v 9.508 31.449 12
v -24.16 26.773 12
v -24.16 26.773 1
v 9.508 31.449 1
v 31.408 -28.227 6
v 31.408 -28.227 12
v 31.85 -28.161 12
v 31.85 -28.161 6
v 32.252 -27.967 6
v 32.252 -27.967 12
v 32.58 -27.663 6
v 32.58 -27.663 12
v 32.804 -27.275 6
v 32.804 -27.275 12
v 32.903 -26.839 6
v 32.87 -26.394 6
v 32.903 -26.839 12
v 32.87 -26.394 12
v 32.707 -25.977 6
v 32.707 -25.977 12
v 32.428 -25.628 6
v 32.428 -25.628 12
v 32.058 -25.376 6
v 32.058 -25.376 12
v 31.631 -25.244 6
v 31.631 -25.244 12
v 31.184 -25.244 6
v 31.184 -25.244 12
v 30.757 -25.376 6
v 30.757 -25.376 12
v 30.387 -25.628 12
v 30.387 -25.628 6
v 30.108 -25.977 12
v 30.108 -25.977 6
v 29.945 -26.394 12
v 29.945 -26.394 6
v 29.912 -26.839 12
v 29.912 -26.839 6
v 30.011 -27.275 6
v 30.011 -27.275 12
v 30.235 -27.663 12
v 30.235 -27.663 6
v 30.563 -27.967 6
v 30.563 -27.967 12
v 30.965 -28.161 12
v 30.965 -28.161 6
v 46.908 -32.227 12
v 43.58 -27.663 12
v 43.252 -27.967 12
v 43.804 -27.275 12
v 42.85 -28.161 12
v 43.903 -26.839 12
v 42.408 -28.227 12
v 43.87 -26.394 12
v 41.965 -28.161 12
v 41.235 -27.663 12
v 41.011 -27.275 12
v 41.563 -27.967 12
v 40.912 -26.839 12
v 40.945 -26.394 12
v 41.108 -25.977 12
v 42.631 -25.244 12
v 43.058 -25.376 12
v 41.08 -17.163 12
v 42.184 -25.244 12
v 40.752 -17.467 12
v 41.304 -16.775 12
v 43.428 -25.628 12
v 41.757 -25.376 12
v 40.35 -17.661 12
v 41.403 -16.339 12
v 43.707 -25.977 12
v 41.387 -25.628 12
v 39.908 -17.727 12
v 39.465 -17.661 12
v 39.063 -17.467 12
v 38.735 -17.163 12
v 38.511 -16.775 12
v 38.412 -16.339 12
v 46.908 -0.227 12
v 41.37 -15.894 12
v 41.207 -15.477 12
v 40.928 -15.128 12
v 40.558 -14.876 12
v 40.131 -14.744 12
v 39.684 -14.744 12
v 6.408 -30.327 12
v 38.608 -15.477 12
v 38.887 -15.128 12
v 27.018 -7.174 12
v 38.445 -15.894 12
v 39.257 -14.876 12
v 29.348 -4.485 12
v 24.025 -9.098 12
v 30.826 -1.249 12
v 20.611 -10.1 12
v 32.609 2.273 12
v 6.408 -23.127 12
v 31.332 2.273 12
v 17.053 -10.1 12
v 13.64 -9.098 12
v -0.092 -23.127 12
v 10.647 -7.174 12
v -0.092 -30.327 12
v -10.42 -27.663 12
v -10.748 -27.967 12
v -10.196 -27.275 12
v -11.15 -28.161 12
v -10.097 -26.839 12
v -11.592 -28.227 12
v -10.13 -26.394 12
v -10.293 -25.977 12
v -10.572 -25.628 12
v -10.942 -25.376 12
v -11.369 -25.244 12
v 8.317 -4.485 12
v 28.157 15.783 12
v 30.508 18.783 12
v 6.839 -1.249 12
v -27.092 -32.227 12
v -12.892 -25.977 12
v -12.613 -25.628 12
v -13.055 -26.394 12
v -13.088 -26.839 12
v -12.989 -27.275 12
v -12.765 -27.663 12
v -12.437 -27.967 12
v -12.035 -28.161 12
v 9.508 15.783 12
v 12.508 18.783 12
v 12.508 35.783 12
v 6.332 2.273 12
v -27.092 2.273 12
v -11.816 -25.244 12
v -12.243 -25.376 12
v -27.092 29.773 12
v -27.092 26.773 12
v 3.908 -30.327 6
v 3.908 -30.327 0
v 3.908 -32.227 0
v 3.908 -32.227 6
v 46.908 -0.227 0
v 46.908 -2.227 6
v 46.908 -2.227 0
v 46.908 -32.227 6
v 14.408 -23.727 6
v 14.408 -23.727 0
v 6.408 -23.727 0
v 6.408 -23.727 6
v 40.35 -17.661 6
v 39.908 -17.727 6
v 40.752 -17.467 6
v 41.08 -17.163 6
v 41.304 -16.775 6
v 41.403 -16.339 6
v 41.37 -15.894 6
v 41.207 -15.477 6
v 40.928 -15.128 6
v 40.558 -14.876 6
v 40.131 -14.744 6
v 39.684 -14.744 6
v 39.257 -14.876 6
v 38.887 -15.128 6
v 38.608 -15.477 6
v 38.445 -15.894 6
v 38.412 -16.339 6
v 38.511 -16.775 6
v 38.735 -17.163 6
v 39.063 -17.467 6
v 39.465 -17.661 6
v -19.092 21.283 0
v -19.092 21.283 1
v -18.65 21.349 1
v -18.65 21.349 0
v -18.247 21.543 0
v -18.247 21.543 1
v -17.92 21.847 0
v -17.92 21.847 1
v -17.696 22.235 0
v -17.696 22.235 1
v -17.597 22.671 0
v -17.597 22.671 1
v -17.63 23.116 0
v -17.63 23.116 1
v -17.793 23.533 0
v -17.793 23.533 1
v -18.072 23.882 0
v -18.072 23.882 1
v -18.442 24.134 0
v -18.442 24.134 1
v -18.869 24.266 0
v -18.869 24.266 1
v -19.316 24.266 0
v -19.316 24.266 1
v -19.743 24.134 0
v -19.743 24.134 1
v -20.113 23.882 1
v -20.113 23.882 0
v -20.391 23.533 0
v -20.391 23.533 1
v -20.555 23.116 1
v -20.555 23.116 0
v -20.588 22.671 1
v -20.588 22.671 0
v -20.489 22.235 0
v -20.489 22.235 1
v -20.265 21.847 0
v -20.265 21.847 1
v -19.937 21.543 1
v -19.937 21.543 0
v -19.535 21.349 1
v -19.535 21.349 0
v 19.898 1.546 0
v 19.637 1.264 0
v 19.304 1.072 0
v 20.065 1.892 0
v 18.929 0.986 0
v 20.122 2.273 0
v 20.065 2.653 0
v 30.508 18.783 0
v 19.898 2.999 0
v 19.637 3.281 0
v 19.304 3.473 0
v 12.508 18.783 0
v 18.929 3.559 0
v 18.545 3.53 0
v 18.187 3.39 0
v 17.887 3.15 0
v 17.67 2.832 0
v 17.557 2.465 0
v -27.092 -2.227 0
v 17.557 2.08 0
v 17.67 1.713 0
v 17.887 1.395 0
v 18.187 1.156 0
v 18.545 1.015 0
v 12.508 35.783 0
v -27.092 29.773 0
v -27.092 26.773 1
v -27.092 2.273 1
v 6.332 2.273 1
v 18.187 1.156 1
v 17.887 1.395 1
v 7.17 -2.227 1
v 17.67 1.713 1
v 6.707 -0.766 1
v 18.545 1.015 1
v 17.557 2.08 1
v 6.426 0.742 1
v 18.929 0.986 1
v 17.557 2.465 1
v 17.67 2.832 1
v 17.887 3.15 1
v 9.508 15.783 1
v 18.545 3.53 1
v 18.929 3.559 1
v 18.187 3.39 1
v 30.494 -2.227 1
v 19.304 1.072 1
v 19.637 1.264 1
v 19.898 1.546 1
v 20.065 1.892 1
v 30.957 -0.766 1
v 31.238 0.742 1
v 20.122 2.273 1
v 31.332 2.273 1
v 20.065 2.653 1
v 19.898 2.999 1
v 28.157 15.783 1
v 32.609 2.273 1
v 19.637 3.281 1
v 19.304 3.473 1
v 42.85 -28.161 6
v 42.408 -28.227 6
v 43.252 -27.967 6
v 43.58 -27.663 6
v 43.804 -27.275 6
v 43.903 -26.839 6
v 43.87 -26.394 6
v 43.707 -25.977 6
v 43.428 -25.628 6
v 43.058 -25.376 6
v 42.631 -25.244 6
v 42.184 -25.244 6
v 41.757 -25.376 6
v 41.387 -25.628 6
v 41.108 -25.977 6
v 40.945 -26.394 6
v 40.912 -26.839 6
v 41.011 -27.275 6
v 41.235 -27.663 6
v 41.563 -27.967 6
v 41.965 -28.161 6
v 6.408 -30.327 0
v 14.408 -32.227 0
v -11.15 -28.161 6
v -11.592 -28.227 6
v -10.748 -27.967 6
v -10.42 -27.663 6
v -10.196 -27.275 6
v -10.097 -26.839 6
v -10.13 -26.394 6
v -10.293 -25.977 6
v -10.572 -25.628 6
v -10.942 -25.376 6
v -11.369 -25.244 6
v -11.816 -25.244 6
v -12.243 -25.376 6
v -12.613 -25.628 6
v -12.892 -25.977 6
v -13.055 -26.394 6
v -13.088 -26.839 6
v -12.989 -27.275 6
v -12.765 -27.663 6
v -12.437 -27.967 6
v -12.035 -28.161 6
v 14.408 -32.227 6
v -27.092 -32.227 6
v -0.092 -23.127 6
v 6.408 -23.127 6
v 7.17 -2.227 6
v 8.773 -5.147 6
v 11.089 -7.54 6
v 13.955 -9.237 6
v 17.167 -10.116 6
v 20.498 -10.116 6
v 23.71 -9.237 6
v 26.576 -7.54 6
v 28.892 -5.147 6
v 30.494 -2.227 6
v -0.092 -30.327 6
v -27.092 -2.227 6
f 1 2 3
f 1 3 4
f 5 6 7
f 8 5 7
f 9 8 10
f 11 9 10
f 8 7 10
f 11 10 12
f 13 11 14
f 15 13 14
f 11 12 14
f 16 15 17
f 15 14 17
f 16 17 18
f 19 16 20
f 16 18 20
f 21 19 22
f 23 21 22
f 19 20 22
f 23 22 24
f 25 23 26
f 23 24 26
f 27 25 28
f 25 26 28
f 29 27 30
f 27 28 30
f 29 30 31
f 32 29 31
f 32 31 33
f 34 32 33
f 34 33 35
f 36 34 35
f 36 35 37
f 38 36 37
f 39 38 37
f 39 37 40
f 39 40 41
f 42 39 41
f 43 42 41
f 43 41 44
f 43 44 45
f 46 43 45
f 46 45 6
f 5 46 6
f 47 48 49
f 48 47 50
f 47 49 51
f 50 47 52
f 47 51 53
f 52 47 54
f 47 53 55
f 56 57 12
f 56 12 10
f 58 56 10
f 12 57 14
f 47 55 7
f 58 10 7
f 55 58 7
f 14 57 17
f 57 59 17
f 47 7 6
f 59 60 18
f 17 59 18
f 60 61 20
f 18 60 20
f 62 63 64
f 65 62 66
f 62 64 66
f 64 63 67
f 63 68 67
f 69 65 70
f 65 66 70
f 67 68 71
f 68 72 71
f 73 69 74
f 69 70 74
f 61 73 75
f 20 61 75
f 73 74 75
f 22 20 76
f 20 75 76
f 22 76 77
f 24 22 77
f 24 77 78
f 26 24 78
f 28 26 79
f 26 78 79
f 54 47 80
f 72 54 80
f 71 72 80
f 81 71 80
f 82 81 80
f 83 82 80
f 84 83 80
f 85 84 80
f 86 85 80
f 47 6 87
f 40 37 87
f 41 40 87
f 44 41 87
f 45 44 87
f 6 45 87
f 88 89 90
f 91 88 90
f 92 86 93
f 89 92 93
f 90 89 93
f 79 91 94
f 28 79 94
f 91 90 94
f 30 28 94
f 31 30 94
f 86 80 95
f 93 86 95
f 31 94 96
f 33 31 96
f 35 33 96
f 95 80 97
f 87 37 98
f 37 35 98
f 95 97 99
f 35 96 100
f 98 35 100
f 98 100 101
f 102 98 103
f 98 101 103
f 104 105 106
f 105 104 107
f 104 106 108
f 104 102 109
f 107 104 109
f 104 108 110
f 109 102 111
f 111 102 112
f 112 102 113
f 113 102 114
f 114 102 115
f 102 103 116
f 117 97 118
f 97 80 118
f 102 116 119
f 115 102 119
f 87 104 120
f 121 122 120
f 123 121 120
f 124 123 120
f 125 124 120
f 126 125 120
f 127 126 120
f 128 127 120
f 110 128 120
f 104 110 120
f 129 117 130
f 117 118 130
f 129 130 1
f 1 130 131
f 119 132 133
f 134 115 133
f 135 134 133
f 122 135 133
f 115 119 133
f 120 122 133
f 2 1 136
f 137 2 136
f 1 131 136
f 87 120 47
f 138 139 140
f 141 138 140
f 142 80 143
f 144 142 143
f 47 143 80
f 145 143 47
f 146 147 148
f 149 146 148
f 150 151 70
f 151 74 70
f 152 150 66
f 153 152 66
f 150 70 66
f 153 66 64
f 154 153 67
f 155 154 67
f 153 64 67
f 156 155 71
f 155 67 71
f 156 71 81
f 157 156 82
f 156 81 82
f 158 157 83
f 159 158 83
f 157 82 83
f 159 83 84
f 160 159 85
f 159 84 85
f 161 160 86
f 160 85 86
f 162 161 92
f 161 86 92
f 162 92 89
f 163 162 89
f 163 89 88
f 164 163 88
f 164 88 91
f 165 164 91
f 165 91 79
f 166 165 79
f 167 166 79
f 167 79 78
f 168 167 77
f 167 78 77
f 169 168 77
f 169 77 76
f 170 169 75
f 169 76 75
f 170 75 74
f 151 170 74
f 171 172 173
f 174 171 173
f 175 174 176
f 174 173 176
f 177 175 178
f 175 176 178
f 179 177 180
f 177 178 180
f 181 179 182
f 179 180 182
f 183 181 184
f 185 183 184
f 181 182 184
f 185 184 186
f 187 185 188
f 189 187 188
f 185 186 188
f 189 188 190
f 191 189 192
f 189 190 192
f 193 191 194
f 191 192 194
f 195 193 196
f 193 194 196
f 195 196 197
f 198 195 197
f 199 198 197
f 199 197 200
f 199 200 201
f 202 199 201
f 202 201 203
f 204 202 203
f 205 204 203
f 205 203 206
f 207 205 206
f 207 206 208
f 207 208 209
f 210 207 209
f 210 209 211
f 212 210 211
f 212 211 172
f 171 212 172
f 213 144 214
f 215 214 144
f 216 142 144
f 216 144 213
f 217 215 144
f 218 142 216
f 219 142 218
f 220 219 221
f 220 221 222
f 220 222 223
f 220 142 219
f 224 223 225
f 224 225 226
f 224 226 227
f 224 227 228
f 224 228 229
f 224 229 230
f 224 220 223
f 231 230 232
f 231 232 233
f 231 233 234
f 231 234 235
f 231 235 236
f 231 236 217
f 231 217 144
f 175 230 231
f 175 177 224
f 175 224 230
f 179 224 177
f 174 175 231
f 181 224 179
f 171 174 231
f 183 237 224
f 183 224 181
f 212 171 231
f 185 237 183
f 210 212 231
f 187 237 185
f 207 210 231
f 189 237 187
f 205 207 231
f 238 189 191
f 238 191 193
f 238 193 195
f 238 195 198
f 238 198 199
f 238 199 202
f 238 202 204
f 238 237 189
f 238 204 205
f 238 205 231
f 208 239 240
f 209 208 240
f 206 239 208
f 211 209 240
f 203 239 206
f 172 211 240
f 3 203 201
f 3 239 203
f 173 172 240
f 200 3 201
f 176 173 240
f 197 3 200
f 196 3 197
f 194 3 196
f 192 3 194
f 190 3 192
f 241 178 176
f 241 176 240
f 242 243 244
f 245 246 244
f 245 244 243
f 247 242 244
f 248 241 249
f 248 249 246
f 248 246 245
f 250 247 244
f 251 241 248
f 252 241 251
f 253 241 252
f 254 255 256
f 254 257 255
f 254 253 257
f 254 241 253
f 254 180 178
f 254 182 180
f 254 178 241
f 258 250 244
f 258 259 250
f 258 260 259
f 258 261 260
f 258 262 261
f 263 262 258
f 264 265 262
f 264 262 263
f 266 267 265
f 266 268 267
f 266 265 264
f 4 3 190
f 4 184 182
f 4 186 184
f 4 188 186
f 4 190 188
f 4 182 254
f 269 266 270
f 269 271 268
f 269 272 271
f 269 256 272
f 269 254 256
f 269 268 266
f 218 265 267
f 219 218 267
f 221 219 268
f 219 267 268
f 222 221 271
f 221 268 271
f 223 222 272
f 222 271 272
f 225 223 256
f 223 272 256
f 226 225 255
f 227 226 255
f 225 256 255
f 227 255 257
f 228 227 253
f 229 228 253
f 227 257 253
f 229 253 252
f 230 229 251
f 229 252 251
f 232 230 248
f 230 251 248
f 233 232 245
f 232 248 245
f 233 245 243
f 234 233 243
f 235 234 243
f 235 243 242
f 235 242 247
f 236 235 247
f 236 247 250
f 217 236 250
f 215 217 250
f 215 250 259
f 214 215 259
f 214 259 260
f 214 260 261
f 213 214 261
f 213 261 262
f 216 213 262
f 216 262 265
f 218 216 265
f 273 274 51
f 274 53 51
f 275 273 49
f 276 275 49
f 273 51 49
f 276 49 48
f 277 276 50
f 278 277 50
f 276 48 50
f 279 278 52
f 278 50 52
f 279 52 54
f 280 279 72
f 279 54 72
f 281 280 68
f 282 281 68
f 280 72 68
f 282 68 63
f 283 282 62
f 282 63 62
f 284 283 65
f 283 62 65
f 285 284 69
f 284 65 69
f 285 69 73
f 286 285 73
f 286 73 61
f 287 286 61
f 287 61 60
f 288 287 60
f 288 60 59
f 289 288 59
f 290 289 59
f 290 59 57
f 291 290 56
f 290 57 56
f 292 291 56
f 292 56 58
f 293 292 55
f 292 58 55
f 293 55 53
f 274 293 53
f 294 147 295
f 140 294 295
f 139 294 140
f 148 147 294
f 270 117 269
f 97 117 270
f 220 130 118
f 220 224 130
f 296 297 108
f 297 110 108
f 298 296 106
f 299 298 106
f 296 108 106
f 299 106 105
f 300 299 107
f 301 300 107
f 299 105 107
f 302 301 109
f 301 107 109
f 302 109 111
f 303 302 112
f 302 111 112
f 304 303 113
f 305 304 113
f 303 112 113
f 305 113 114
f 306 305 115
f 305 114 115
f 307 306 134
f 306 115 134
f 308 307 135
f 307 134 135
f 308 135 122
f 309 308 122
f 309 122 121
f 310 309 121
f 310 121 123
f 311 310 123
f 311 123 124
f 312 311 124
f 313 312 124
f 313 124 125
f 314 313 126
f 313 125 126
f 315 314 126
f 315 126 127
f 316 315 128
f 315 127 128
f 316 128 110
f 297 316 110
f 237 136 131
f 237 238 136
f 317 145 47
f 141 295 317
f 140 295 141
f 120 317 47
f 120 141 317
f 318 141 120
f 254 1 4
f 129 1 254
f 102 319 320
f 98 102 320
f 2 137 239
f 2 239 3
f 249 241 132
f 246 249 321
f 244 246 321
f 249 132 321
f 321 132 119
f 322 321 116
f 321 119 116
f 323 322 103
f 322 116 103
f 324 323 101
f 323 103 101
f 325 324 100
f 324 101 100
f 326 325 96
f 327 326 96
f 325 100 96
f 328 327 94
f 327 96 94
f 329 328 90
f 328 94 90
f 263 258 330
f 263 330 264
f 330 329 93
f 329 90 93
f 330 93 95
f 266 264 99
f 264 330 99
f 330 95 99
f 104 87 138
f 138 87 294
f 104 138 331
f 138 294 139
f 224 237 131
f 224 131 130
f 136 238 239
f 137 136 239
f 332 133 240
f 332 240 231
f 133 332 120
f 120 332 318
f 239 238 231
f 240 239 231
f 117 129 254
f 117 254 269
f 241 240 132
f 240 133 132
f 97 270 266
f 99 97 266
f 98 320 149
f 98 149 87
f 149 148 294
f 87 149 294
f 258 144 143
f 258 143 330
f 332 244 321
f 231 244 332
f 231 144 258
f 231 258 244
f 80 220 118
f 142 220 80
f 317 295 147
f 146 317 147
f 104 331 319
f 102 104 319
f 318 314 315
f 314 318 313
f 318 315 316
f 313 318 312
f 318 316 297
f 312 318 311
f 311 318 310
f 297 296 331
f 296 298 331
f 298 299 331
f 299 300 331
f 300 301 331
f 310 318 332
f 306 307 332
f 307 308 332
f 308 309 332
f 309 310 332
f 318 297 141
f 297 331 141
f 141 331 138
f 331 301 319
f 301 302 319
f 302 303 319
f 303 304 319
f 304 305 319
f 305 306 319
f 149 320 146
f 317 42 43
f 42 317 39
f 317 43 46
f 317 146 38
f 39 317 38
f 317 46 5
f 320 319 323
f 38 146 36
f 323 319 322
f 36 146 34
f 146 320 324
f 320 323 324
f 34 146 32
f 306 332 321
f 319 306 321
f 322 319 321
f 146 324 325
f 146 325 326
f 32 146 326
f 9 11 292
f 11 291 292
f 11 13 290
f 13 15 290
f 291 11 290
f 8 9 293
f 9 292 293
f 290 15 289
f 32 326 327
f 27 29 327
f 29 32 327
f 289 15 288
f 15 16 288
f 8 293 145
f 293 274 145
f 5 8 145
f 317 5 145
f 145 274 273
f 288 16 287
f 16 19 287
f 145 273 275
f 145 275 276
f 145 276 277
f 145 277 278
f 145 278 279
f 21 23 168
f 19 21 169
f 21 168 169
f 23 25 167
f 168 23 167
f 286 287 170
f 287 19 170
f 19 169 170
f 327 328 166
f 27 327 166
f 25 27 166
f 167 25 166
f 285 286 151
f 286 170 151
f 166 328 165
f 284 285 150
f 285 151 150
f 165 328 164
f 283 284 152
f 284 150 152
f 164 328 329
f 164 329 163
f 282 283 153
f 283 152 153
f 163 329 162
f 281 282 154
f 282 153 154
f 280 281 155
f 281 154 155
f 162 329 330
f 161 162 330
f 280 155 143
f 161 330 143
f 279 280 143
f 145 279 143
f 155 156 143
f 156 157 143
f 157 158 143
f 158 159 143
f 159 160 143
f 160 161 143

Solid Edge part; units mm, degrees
sketch "Sketch1" plane through (0, 0, 0) normal (0, 0, 1) x (1, 0, 0)
  line L0 (12.5075, 35.7826) -> (12.5075, 18.7826)
  line L1 (12.5075, 18.7826) -> (30.5075, 18.7826)
  line L2 (30.5075, 18.7826) -> (46.9075, -0.2273)
  line L3 (46.9075, -0.2273) -> (46.9075, -32.2273)
  line L4 (46.9075, -32.2273) -> (-27.0925, -32.2273)
  line L5 (-27.0925, -32.2273) -> (-27.0925, -0.7273)
  line L6 (-27.0925, -0.7273) -> (-60.0925, -0.7273)
  line L7 (-60.0925, -0.7273) -> (-60.0925, 29.7727)
  line L8 (-60.0925, 29.7727) -> (-27.0925, 29.7727)
  line L9 (-27.0925, 29.7727) -> (12.5075, 35.7826)
  dimension "D1" = 74
  dimension "D2" = 32
  dimension "D3" = 31.5
  dimension "D4" = 33
  dimension "D5" = 30.5
  dimension "D6" = 33
  dimension "D7" = 18
  dimension "D8" = 17
extrude "Ajout_matière_1" add sketch "Sketch1" along normal blind 12
sketch "Sketch2" plane through (-11.8425, 1.7776, 12) normal (0, 0, 1) x (1, 0, 0)
  line L0 (-45.25, 24.995) -> (-45.25, 0.495)
  line L1 (-45.25, 0.495) -> (18.1748, 0.495)
  line L2 (44.4511, 0.495) -> (43.1748, 0.495)
  line L3 (39.9995, 14.005) -> (44.4511, 0.495)
  line L4 (21.35, 14.005) -> (39.9995, 14.005)
  line L5 (21.35, 29.6711) -> (21.35, 14.005)
  line L6 (-12.3173, 24.995) -> (21.35, 29.6711)
  line L7 (-45.25, 24.995) -> (-12.3173, 24.995)
  arc A0 (18.1748, 0.495) -> (43.1748, 0.495) centre (30.6748, 0.495) ccw
extrude "Enlèvement_matière_1" cut sketch "Sketch2" against normal blind 11
sketch "Sketch3" plane through (-12.2419, 10.6107, 1) normal (0, 0, 1) x (1, 0, 0)
  circle A0 centre (31.0742, -8.338) radius 1.2899
extrude "Cutout1" cut sketch "Sketch3" along normal through all and the other way through all
sketch "Sketch4" plane through (-11.8425, 1.7776, 0) normal (0, 0, -1) x (0, 1, 0)
  line L0 (-34.005, 58.75) -> (-4.005, 58.75)
  line L1 (-4.005, 58.75) -> (-4.005, -15.25)
  line L2 (-4.005, -15.25) -> (-34.005, -15.25)
  line L3 (-34.005, -15.25) -> (-34.005, 15.75)
  line L4 (-25.505, 15.75) -> (-34.005, 15.75)
  line L5 (-25.505, 26.25) -> (-25.505, 15.75)
  line L6 (-34.005, 26.25) -> (-25.505, 26.25)
  line L7 (-34.005, 26.25) -> (-34.005, 58.75)
  dimension "D1" = 30
  dimension "D2" = 10.5
  dimension "D3" = 8.5
  dimension "D4" = 32.5
extrude "Enlèvement_matière_3" cut sketch "Sketch4" against normal blind 6
sketch "Sketch5" plane through (-6.5925, 1.7776, 12) normal (0, 0, 1) x (0, -1, 0)
  circle A0 centre (28.505, 49) radius 1.5
  circle A1 centre (28.505, 38) radius 1.5
  circle A2 centre (28.505, -5) radius 1.5
  line L0 (24.905, 13) -> (32.105, 13)
  line L1 (32.105, 13) -> (32.105, 6.5)
  line L2 (32.105, 6.5) -> (24.905, 6.5)
  line L3 (24.905, 6.5) -> (24.905, 13)
  dimension "D1" = 4.5
  dimension "D2" = 5.5
  dimension "D3" = 3
  dimension "D4" = 15.5
  dimension "D5" = 3
  dimension "D6" = 15.5
  dimension "D7" = 6.5
  dimension "D8" = 7.2
  dimension "D9" = 27
extrude "Cutout2" cut sketch "Sketch5" along normal through all and the other way through all
sketch "Sketch6" plane through (-12.2419, 14.6107, 1) normal (0, 0, 1) x (0, -1, 0)
  circle A0 centre (-8.1719, -6.8505) radius 1.5
  dimension "D1" = 41
  dimension "D2" = 3
  dimension "D3" = 13
  dimension "D4" = 44.0653
extrude "Cutout3" cut sketch "Sketch6" along normal through all and the other way through all
sketch "Sketch7" plane through (-6.5925, 1.7776, 12) normal (0, 0, 1) x (0, -1, 0)
  circle A0 centre (18.005, 46.5) radius 1.5
  dimension "D1" = 3
  dimension "D2" = 7
  dimension "D3" = 16
extrude "Cutout4" cut sketch "Sketch7" along normal through all and the other way through all
sketch "Sketch8" plane through (-6.5925, 1.7776, 12) normal (0, 0, 1) x (-1, 0, 0)
  line L0 (20.5, 2.505) -> (58.2278, 2.505)
  line L1 (58.2278, 2.505) -> (58.2278, -30.8265)
  line L2 (58.2278, -30.8265) -> (20.5, -30.8265)
  line L3 (20.5, -30.8265) -> (20.5, 2.505)
  dimension "D1" = 37.7278
  dimension "D2" = 33.3314
extrude "Enlèvement_matière_7" cut sketch "Sketch8" along normal mid plane 65.5466
properties material "Nylon, usage général"
